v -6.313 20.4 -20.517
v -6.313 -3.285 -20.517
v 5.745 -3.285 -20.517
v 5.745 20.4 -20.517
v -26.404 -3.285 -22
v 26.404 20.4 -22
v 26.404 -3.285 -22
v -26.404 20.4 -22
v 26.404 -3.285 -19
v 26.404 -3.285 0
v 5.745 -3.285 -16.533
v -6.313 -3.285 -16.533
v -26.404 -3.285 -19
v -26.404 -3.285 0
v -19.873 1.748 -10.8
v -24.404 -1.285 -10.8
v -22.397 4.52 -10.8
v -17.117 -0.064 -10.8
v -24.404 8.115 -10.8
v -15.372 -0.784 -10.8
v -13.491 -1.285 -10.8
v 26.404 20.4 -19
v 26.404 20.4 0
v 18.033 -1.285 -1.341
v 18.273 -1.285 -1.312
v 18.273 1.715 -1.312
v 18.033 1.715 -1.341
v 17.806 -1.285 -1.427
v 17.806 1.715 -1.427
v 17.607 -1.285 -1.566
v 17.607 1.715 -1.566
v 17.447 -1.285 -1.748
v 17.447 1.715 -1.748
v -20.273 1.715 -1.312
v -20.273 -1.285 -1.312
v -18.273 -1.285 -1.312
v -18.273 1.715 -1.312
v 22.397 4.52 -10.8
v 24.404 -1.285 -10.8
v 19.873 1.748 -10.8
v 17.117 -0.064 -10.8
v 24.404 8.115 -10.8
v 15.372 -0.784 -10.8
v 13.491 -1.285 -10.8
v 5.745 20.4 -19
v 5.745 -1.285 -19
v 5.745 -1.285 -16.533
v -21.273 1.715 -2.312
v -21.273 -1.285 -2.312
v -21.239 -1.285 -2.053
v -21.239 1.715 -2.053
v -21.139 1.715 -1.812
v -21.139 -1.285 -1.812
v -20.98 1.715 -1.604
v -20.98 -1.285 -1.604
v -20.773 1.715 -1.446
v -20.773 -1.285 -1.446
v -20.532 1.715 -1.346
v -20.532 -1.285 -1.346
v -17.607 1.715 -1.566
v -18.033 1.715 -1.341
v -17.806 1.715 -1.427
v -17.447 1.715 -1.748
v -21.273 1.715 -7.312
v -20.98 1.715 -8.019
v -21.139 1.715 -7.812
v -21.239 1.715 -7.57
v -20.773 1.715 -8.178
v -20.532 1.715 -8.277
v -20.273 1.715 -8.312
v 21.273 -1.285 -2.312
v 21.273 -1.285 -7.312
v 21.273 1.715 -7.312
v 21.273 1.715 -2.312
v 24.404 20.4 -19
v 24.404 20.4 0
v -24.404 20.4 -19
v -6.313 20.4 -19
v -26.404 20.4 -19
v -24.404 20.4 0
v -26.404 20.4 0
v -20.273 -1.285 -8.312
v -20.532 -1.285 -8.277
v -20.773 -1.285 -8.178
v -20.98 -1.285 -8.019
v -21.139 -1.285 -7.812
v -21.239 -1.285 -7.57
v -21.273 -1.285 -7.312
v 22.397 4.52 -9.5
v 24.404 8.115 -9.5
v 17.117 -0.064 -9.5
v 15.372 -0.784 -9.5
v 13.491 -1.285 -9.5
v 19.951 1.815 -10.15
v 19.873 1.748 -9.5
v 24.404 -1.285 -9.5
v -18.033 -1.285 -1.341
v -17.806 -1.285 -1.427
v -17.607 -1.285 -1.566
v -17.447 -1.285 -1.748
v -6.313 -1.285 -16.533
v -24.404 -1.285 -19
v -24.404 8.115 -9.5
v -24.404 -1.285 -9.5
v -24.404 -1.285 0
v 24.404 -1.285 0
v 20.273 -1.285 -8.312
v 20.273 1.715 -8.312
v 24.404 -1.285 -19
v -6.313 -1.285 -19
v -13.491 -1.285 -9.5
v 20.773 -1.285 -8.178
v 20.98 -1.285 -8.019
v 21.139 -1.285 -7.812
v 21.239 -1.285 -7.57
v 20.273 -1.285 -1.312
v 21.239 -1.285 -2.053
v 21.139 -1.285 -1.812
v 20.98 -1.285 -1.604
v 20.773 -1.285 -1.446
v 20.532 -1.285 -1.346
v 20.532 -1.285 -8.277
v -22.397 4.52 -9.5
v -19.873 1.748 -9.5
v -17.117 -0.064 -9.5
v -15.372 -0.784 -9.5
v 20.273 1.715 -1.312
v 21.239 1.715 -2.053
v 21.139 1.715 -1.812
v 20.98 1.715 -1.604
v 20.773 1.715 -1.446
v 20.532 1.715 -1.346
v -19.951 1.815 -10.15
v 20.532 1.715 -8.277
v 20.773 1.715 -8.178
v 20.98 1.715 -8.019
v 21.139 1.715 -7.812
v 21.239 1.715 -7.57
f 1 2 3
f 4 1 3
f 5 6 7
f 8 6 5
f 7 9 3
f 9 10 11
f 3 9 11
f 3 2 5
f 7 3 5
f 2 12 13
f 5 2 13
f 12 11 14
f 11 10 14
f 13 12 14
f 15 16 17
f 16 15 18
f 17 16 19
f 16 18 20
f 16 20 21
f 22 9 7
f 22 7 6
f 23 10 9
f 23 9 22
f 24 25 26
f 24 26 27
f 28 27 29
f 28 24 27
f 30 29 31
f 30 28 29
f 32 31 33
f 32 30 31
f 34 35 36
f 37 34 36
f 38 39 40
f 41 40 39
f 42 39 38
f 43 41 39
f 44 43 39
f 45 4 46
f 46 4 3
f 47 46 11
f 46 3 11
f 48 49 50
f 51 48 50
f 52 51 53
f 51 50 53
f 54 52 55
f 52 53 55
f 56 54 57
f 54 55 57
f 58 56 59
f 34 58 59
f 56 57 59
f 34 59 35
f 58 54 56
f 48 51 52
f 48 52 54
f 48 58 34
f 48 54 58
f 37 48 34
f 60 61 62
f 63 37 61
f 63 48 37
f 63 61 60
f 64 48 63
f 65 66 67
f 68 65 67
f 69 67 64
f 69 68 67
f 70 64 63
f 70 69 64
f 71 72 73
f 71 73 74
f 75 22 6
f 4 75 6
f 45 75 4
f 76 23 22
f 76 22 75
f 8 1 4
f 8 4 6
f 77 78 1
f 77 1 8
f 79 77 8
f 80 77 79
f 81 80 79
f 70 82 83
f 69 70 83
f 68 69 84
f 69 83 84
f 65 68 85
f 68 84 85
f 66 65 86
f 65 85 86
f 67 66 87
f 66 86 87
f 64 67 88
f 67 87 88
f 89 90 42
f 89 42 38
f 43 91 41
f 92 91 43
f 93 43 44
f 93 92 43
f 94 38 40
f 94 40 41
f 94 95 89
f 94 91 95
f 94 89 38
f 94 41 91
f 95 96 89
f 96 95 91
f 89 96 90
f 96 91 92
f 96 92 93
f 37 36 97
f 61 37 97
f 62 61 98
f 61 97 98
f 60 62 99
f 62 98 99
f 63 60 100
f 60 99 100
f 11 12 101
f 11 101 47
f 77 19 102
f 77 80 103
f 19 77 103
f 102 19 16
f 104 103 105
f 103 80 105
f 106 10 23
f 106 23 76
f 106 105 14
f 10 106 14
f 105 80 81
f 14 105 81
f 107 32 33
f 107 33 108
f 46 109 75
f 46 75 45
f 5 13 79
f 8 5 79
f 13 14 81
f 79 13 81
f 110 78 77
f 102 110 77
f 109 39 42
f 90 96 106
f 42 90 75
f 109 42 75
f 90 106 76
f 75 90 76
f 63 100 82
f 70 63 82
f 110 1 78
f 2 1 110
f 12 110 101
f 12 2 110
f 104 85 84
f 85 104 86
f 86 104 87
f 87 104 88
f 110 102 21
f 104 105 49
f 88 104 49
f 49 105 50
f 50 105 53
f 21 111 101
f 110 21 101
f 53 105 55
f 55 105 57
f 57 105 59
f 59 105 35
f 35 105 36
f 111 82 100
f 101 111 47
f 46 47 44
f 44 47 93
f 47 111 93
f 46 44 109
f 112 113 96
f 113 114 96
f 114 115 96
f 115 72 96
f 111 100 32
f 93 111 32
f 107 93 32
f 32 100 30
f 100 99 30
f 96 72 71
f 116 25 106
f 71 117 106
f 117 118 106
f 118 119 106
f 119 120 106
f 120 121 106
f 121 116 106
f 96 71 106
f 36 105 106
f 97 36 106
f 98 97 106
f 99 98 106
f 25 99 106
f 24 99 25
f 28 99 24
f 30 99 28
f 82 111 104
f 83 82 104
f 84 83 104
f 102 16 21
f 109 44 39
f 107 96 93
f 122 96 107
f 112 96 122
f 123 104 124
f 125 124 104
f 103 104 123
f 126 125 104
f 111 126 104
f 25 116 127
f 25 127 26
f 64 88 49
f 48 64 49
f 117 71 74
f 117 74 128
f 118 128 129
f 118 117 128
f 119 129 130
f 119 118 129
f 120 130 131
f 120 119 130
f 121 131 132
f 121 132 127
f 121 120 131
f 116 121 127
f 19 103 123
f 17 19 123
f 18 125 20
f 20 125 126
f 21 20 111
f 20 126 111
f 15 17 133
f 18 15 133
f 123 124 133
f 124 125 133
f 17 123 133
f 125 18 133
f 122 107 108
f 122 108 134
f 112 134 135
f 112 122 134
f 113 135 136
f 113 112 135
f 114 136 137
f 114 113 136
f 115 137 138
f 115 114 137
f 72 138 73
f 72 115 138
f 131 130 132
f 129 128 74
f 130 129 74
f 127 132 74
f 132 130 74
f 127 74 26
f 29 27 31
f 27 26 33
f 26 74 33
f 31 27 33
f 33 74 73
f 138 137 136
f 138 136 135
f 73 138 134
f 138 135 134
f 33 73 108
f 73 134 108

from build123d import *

# Parameters (mm, degrees)
SALIENTE_EXTRUIR1_DEPTH = 19
CROQUIS3_W              = 52.808095268
CROQUIS3_H              = 23.684781413
SALIENTE_EXTRUIR2_DEPTH = 3
CROQUIS4_W              = 12.057899081
CROQUIS4_H              = 3.984349261
CORTAR_EXTRUIR1_DEPTH   = 26
SALIENTE_EXTRUIR3_DEPTH = 3
SALIENTE_EXTRUIR4_DEPTH = 1.3


with BuildPart() as part:
    # Croquis1 → Saliente-Extruir1 (new body)
    with BuildSketch(Plane.XY):
        Polygon((-24.404047634, 20.4), (-24.404047634, -1.284781413), (24.404047634, -1.284781413), (24.404047634, 20.4), (26.404047634, 20.4), (26.404047634, -3.284781413), (-26.404047634, -3.284781413), (-26.404047634, 20.4), align=None)
    extrude(amount=-SALIENTE_EXTRUIR1_DEPTH)

    # Croquis3 → Saliente-Extruir2 (add)
    with BuildSketch(Plane(origin=(0, 0, -19), x_dir=(-1, 0, 0), z_dir=(0, 0, -1))):
        with Locations((0, 8.557609294)):
            Rectangle(CROQUIS3_W, CROQUIS3_H)
    extrude(amount=SALIENTE_EXTRUIR2_DEPTH)

    # Croquis4 → Cortar-Extruir1 (cut)
    with BuildSketch(Plane.XZ.offset(3.284781413)):
        with Locations((-0.283990929, -18.525322076)):
            Rectangle(CROQUIS4_W, CROQUIS4_H)
    extrude(amount=-CORTAR_EXTRUIR1_DEPTH, mode=Mode.SUBTRACT)

    # Croquis8 → Saliente-Extruir3 (add)
    with BuildSketch(Plane(origin=(0, -1.284781413, 0), x_dir=(1, 0, 0), z_dir=(0, 1, 0))):
        with BuildLine():
            Line((-20.273206473, 1.311556937), (-18.273206473, 1.311556937))
            ThreePointArc((-18.273206473, 1.311556937), (-17.806113325, 1.427348822), (-17.447191369, 1.747908954))
            Line((-17.447191369, 1.747908954), (-20.273206473, 8.311556937))
            ThreePointArc((-20.273206473, 8.311556937), (-20.980313254, 8.018663718), (-21.273206473, 7.311556937))
            Line((-21.273206473, 7.311556937), (-21.273206473, 2.311556937))
            ThreePointArc((-21.273206473, 2.311556937), (-20.980313254, 1.604450156), (-20.273206473, 1.311556937))
        make_face()
        with BuildLine():
            Line((20.273206473, 1.311556937), (18.273206473, 1.311556937))
            ThreePointArc((18.273206473, 1.311556937), (17.806113325, 1.427348822), (17.447191369, 1.747908954))
            Line((17.447191369, 1.747908954), (20.273206473, 8.311556937))
            ThreePointArc((20.273206473, 8.311556937), (20.980313254, 8.018663718), (21.273206473, 7.311556937))
            Line((21.273206473, 7.311556937), (21.273206473, 2.311556937))
            ThreePointArc((21.273206473, 2.311556937), (20.980313254, 1.604450156), (20.273206473, 1.311556937))
        make_face()
    extrude(amount=SALIENTE_EXTRUIR3_DEPTH)

    # Croquis9 → Saliente-Extruir4 (add)
    with BuildSketch(Plane(origin=(0, 0, -9.5), x_dir=(-1, 0, 0), z_dir=(0, 0, -1))):
        with BuildLine():
            Line((24.404047634, -1.284781413), (13.491213659, -1.284781413))
            add(Edge.make_bspline(
                [(24.404047634, 8.114982057), (20.954967317, 0.215218587), (13.491213659, -1.284781413)],
                knots=[0, 0, 0, 1, 1, 1], degree=2))
            Line((24.404047634, 8.114982057), (24.404047634, -1.284781413))
        make_face()
        with BuildLine():
            Line((-24.404047634, -1.284781413), (-13.491213659, -1.284781413))
            add(Edge.make_bspline(
                [(-24.404047634, 8.114982057), (-20.954967317, 0.215218587), (-13.491213659, -1.284781413)],
                knots=[0, 0, 0, 1, 1, 1], degree=2))
            Line((-24.404047634, 8.114982057), (-24.404047634, -1.284781413))
        make_face()
    extrude(amount=SALIENTE_EXTRUIR4_DEPTH)


solid = part.part
